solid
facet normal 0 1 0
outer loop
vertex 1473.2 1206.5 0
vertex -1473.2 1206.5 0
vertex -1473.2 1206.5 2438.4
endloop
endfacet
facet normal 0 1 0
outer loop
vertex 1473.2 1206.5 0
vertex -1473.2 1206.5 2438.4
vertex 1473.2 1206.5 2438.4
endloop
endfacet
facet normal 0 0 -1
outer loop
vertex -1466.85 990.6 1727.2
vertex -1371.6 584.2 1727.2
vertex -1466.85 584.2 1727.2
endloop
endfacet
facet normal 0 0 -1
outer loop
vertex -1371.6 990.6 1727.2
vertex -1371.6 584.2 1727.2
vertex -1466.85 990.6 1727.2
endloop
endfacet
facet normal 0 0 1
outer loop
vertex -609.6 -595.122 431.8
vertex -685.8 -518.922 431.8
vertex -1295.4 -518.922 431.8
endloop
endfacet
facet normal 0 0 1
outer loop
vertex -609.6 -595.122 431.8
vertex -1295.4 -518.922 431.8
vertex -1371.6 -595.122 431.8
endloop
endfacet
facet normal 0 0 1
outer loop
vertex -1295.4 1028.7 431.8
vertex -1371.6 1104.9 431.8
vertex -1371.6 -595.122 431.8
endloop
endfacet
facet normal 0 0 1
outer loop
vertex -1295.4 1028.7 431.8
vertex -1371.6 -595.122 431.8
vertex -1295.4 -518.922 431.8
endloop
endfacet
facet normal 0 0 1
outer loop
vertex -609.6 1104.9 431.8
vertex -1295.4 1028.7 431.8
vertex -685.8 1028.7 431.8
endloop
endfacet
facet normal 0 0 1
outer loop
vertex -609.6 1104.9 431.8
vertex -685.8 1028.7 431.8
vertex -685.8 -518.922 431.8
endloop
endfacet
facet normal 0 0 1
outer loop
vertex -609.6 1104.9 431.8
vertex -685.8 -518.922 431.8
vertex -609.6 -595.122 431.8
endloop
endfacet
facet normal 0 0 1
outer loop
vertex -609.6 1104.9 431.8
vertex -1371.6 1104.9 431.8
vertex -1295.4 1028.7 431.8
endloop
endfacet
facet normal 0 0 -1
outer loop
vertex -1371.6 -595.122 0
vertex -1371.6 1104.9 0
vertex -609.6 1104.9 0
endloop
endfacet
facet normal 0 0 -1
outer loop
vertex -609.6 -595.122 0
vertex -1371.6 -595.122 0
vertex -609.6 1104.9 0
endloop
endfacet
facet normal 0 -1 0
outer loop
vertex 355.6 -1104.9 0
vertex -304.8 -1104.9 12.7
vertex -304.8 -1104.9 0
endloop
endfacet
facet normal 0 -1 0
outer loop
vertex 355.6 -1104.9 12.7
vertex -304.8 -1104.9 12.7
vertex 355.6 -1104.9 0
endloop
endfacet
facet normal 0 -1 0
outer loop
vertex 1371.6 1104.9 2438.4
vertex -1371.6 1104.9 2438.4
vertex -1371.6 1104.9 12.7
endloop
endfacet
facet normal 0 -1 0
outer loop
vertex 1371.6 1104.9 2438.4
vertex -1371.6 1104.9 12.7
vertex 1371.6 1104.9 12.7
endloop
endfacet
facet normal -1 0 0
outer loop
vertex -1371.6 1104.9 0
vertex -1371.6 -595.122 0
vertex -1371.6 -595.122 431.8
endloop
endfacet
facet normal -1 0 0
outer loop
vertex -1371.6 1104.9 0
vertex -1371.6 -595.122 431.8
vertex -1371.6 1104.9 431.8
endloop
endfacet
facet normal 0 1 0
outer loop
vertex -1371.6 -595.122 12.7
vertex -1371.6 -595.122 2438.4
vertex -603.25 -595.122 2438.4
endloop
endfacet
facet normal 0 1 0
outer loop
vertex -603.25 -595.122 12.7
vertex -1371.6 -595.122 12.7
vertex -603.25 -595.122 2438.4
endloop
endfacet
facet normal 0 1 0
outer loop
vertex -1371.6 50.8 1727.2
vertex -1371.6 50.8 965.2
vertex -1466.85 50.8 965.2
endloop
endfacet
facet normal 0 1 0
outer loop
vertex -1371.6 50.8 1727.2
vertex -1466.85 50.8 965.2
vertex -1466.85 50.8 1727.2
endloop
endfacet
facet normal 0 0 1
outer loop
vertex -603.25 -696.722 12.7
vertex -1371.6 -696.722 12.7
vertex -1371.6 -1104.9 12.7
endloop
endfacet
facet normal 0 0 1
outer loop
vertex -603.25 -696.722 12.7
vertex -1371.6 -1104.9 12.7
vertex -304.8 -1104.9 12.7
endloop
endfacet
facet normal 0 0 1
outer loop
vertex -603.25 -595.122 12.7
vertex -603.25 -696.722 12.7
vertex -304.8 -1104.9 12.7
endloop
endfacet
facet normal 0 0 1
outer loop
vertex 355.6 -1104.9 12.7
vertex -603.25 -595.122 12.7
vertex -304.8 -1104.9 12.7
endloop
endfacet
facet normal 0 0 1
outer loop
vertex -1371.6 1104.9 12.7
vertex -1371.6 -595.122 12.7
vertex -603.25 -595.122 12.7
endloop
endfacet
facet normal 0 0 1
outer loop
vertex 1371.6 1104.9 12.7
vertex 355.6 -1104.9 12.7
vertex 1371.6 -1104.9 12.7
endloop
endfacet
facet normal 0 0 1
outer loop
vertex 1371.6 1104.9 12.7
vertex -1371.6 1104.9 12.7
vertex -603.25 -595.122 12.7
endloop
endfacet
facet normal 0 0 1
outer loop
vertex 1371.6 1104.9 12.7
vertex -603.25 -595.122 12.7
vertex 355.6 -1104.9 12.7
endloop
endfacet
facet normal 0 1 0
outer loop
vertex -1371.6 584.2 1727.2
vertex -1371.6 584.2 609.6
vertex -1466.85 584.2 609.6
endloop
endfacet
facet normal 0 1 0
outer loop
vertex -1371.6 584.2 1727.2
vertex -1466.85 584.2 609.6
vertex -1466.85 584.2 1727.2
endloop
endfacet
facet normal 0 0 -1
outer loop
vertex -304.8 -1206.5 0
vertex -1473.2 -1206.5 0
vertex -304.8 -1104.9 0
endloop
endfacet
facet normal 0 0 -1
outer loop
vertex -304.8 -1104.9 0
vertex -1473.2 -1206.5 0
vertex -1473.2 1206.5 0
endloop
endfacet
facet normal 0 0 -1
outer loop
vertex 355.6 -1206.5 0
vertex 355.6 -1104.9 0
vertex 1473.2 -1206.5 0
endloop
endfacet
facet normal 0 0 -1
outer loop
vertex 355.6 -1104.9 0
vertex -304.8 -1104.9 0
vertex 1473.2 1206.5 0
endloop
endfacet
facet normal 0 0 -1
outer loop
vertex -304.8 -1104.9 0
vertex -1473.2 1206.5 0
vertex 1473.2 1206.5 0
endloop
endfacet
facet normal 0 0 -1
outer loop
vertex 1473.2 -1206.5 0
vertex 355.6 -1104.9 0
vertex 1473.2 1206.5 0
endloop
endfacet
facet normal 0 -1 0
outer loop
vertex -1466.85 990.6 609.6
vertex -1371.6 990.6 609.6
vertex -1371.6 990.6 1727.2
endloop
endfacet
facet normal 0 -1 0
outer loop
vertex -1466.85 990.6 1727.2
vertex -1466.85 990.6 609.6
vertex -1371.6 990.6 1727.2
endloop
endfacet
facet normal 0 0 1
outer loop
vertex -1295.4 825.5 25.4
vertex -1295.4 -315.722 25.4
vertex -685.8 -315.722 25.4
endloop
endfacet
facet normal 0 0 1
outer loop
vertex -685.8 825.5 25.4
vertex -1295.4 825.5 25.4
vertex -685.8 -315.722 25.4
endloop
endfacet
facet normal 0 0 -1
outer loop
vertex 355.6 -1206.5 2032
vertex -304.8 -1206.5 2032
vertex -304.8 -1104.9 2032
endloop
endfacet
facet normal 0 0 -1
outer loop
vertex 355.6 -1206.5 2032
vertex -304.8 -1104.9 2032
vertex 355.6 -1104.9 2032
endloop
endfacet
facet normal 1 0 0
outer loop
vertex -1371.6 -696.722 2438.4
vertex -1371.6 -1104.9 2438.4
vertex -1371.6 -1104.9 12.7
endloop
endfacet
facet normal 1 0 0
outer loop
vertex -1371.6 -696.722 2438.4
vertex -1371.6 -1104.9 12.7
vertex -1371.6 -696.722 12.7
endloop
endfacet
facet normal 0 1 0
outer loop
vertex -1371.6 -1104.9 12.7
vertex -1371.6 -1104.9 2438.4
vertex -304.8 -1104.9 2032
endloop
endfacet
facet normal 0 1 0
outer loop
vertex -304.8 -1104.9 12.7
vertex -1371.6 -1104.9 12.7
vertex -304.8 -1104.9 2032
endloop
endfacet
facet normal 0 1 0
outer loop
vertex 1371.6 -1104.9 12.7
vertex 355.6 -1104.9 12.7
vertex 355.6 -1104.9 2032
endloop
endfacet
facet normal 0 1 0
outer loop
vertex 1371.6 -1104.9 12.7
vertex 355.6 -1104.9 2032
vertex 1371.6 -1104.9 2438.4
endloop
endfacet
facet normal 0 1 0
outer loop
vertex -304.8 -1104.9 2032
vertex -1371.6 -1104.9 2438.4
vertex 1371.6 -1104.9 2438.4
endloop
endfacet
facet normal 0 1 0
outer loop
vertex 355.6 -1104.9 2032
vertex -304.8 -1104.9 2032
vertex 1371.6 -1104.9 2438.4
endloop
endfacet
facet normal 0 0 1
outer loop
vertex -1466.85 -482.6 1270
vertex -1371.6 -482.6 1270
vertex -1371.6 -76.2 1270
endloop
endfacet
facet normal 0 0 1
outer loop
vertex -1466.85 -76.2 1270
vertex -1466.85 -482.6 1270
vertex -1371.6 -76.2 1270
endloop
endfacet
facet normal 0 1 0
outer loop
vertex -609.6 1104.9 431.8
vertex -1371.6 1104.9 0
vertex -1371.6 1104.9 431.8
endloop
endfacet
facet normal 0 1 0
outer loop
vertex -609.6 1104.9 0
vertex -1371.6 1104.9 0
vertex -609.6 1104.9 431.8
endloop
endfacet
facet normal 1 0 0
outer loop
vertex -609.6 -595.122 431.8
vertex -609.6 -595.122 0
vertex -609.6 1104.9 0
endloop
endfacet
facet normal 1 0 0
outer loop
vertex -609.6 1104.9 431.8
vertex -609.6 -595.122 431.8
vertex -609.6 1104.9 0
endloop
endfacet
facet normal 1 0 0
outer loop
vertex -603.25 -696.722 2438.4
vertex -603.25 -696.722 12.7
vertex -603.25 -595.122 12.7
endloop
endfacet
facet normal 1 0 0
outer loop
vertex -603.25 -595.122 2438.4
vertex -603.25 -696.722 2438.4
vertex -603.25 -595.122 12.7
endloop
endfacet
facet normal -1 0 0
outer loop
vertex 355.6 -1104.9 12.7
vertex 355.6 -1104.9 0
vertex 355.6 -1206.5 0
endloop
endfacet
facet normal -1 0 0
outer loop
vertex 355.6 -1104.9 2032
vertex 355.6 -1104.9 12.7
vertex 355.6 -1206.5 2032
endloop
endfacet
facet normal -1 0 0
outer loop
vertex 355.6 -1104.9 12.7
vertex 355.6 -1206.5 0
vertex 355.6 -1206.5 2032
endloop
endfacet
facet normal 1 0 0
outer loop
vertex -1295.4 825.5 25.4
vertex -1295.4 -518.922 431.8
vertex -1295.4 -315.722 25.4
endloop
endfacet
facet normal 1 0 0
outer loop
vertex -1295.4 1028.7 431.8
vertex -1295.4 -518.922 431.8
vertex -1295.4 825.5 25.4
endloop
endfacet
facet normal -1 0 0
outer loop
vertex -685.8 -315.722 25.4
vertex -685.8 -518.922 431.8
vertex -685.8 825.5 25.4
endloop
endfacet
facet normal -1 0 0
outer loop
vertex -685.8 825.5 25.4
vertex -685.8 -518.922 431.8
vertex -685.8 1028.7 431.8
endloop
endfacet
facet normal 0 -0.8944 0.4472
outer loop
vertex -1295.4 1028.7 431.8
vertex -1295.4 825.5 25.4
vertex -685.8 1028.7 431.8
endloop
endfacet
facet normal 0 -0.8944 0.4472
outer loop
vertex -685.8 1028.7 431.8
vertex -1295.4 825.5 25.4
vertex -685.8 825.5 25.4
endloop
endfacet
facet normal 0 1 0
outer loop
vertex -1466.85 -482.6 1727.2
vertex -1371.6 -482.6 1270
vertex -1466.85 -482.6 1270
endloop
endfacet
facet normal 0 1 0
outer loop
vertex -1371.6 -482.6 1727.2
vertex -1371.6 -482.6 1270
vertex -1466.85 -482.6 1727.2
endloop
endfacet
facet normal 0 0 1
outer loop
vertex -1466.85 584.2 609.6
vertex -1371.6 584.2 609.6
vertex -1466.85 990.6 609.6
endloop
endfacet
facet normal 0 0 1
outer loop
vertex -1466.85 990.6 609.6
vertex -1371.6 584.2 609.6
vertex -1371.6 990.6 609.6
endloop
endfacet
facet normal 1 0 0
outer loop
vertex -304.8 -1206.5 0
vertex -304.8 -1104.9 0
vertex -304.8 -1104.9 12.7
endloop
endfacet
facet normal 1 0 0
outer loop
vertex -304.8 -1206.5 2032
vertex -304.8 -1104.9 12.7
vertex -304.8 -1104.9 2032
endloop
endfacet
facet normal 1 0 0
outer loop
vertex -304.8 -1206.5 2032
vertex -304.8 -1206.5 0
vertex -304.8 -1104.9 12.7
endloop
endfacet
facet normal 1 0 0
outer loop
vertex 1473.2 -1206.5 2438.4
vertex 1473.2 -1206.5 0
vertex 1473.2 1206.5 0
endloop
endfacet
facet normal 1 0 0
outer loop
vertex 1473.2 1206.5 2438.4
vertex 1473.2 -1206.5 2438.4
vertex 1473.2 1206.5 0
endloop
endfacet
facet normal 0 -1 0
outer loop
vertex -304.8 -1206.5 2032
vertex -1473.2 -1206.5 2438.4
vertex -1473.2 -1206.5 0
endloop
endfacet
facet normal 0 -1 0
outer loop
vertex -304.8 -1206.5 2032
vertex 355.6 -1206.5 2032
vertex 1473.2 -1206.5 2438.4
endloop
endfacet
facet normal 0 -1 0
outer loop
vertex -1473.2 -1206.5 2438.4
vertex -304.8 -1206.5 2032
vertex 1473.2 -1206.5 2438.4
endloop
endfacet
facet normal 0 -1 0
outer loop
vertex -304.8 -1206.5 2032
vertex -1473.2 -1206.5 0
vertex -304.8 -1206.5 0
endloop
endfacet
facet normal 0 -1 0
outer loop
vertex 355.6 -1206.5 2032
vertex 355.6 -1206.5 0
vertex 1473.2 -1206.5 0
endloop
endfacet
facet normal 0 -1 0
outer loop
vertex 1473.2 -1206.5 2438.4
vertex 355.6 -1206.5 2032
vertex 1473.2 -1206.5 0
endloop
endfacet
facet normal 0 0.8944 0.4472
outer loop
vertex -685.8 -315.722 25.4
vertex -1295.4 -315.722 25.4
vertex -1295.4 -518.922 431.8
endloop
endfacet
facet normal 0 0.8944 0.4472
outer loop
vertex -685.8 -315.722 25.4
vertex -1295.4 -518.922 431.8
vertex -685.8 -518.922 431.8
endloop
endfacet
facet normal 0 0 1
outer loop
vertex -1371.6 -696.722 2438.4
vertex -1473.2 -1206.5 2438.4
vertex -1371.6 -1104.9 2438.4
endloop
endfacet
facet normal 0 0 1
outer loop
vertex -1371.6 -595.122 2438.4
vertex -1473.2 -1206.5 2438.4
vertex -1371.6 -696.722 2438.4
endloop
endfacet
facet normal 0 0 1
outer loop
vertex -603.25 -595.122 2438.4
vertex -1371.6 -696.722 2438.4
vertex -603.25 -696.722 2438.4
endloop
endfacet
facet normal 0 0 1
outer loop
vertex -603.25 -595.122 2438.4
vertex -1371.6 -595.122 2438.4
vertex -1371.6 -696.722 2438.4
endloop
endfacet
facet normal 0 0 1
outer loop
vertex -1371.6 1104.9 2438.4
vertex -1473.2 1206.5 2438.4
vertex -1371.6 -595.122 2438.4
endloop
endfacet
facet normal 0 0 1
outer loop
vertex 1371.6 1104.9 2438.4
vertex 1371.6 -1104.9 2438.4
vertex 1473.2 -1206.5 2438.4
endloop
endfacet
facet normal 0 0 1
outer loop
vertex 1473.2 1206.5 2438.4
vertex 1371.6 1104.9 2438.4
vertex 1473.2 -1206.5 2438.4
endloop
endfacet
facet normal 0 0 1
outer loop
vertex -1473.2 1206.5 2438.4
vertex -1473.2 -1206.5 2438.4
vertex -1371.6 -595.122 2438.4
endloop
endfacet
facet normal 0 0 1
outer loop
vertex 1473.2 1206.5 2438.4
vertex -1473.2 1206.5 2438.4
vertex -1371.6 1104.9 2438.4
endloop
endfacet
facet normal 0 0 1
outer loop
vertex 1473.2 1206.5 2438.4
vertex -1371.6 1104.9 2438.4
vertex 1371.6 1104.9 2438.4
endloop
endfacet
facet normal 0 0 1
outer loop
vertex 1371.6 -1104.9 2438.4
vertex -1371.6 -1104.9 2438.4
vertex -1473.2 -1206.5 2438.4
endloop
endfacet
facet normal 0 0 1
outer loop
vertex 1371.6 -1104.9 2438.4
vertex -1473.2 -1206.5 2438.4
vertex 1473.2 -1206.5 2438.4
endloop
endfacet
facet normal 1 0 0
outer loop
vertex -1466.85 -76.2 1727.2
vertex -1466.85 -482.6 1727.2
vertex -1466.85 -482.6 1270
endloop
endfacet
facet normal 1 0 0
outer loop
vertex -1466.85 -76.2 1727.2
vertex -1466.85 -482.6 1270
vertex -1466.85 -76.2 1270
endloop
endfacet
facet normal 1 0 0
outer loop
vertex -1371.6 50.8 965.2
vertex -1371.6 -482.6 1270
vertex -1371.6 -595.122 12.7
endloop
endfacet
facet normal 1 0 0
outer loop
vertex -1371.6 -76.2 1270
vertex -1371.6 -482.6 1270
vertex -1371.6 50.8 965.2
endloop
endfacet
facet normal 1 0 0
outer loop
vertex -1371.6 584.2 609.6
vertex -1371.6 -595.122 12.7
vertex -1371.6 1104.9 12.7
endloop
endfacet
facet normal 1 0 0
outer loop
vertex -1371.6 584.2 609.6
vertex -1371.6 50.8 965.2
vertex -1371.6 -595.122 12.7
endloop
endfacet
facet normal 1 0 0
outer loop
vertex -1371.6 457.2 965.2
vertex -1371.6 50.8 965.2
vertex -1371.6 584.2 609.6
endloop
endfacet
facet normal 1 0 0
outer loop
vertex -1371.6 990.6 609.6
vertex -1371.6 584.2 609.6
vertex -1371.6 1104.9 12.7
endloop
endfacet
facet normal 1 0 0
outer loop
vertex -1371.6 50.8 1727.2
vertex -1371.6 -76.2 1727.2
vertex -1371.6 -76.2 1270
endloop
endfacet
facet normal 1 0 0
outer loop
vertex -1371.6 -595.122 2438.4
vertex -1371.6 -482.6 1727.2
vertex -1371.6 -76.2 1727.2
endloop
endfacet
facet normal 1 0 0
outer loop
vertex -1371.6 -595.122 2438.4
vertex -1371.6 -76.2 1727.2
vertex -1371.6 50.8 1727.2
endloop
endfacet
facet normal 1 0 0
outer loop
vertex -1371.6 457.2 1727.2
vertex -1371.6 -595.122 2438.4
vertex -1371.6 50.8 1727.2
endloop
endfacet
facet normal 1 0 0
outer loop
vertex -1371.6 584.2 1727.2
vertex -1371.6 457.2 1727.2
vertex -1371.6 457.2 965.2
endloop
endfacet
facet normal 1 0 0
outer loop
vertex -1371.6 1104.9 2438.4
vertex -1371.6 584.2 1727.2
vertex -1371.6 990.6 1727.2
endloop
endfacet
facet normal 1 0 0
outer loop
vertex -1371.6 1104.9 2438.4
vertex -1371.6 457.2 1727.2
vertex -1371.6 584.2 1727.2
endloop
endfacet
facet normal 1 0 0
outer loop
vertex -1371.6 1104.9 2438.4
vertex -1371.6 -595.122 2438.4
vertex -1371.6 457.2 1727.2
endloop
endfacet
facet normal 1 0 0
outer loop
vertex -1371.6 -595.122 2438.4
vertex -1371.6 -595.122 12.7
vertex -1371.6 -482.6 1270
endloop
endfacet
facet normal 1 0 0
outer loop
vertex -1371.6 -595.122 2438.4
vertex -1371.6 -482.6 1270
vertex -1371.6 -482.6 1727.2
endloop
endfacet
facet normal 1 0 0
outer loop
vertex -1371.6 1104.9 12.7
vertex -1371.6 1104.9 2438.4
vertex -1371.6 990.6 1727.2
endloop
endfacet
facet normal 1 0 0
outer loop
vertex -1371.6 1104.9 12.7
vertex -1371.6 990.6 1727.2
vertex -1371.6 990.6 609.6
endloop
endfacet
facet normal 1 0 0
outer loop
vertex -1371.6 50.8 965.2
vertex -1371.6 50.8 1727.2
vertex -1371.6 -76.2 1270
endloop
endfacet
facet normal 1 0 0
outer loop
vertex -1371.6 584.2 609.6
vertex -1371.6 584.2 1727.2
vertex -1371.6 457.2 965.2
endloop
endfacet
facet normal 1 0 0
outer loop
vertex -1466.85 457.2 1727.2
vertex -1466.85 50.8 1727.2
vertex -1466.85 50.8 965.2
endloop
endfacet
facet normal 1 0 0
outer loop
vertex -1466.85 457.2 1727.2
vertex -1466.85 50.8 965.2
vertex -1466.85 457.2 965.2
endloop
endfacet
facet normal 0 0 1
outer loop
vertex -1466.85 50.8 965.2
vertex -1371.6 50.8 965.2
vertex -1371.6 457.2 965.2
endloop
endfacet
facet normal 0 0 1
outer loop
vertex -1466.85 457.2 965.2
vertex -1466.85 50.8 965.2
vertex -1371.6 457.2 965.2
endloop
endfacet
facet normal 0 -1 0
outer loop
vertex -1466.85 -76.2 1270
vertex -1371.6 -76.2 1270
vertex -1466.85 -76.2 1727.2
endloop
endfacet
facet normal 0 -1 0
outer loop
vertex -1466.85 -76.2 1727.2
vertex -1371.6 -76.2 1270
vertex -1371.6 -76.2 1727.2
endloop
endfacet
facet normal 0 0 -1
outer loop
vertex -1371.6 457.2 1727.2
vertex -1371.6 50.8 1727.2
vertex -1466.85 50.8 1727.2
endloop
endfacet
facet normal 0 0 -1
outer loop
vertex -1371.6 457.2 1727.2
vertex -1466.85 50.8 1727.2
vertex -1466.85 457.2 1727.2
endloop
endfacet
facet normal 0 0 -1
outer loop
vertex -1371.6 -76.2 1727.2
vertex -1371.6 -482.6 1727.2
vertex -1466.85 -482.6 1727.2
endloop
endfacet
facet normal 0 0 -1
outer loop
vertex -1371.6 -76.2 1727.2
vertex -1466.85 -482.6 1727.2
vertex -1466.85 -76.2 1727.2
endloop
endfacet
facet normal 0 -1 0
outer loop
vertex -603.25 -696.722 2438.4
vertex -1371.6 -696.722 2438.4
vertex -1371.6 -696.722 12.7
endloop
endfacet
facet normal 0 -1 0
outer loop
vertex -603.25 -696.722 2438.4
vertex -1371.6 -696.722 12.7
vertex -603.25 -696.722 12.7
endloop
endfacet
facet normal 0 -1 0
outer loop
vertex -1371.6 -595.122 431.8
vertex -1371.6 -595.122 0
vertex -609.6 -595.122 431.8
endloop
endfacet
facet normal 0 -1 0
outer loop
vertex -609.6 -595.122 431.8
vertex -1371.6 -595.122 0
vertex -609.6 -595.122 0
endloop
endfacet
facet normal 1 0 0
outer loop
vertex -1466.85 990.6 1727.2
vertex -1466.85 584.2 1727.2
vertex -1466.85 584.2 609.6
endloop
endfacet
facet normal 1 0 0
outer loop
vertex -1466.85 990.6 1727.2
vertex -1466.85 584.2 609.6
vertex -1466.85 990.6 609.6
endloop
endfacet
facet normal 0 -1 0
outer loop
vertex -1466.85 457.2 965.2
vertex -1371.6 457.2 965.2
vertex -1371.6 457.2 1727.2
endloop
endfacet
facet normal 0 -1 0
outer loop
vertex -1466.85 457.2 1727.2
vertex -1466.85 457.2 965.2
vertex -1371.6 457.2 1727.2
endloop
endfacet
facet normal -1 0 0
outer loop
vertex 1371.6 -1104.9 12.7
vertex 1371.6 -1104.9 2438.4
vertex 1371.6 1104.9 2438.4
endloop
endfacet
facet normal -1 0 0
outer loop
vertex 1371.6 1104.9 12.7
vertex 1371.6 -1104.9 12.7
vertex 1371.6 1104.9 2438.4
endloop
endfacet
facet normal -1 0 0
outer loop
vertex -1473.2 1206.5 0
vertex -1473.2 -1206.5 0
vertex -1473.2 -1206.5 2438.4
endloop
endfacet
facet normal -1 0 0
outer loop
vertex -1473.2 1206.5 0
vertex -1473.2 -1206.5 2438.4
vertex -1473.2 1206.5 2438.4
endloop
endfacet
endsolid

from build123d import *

# Parameters (mm, degrees)
F0_W      = 2946.4
F0_H      = 2413
F1_DEPTH  = 2438.4
F2_W      = 2743.2
F2_H      = 2209.8
F3_DEPTH  = 2425.7
F4_W      = 762
F4_H      = 1700.022
F5_DEPTH  = 431.8
F6_W      = 609.6
F6_H      = 1547.622
F7_DEPTH  = 406.4
F8_SIZE2  = 203.19999
F8_SIZE   = 406.39999
F9_W      = 768.35
F9_H      = 101.6
F10_DEPTH = 2438.4
F11_W     = 660.4
F11_H     = 2032
F12_DEPTH = 101.6
F13_W     = 406.4
F13_H     = 1117.6
F13_H_2   = 762
F13_H_3   = 457.2
F14_DEPTH = 95.25


# Not quite as in the source:
# - a fillet or chamfer is up to 0.001 mm smaller than in the source, because OpenCascade refuses the exact size


with BuildPart() as f1:
    # F0 (on Top) → F1 (new body)
    with BuildSketch(Plane.XY):
        Rectangle(F0_W, F0_H)
    extrude(amount=F1_DEPTH)

    # F2 (on face) → F3 (cut)
    with BuildSketch(Plane.XY.offset(2438.4)):
        Rectangle(F2_W, F2_H)
    extrude(amount=-F3_DEPTH, mode=Mode.SUBTRACT)

    # F9 (on Top) → F10 (join)
    with BuildSketch(Plane.XY):
        with Locations((-987.425, -645.922)):
            Rectangle(F9_W, F9_H)
    extrude(amount=F10_DEPTH)

    # F11 (on face) → F12 (cut)
    with BuildSketch(Plane.XZ.offset(1206.5)):
        with Locations((25.4, 1016)):
            Rectangle(F11_W, F11_H)
    extrude(amount=-F12_DEPTH, mode=Mode.SUBTRACT)

    # F13 (on face) → F14 (cut)
    with BuildSketch(Plane.YZ.offset(-1371.6)):
        with Locations((787.4, 1168.4)):
            Rectangle(F13_W, F13_H)
        with Locations((254, 1346.2)):
            Rectangle(F13_W, F13_H_2)
        with Locations((-279.4, 1498.6)):
            Rectangle(F13_W, F13_H_3)
    extrude(amount=-F14_DEPTH, mode=Mode.SUBTRACT)


with BuildPart() as f5:
    # F4 (on Top) → F5 (new body)
    with BuildSketch(Plane.XY):
        with Locations((-990.6, 254.889)):
            Rectangle(F4_W, F4_H)
    extrude(amount=F5_DEPTH)

    # F6 (on face) → F7 (cut)
    with BuildSketch(Plane.XY.offset(431.8)):
        with Locations((-990.6, 254.889)):
            Rectangle(F6_W, F6_H)
    extrude(amount=-F7_DEPTH, mode=Mode.SUBTRACT)

    # F8 (size 406.4 and 203.2 in the source; OpenCascade refuses exactly that, so slightly less here)
    f8_edges = [f5.edges().sort_by_distance(p)[0] for p in [
        (-990.6, 1028.7, 25.4),
        (-990.6, -518.922, 25.4),
    ]]
    chamfer(f8_edges, length=F8_SIZE, length2=F8_SIZE2)


solid = Compound([f1.part, f5.part])
